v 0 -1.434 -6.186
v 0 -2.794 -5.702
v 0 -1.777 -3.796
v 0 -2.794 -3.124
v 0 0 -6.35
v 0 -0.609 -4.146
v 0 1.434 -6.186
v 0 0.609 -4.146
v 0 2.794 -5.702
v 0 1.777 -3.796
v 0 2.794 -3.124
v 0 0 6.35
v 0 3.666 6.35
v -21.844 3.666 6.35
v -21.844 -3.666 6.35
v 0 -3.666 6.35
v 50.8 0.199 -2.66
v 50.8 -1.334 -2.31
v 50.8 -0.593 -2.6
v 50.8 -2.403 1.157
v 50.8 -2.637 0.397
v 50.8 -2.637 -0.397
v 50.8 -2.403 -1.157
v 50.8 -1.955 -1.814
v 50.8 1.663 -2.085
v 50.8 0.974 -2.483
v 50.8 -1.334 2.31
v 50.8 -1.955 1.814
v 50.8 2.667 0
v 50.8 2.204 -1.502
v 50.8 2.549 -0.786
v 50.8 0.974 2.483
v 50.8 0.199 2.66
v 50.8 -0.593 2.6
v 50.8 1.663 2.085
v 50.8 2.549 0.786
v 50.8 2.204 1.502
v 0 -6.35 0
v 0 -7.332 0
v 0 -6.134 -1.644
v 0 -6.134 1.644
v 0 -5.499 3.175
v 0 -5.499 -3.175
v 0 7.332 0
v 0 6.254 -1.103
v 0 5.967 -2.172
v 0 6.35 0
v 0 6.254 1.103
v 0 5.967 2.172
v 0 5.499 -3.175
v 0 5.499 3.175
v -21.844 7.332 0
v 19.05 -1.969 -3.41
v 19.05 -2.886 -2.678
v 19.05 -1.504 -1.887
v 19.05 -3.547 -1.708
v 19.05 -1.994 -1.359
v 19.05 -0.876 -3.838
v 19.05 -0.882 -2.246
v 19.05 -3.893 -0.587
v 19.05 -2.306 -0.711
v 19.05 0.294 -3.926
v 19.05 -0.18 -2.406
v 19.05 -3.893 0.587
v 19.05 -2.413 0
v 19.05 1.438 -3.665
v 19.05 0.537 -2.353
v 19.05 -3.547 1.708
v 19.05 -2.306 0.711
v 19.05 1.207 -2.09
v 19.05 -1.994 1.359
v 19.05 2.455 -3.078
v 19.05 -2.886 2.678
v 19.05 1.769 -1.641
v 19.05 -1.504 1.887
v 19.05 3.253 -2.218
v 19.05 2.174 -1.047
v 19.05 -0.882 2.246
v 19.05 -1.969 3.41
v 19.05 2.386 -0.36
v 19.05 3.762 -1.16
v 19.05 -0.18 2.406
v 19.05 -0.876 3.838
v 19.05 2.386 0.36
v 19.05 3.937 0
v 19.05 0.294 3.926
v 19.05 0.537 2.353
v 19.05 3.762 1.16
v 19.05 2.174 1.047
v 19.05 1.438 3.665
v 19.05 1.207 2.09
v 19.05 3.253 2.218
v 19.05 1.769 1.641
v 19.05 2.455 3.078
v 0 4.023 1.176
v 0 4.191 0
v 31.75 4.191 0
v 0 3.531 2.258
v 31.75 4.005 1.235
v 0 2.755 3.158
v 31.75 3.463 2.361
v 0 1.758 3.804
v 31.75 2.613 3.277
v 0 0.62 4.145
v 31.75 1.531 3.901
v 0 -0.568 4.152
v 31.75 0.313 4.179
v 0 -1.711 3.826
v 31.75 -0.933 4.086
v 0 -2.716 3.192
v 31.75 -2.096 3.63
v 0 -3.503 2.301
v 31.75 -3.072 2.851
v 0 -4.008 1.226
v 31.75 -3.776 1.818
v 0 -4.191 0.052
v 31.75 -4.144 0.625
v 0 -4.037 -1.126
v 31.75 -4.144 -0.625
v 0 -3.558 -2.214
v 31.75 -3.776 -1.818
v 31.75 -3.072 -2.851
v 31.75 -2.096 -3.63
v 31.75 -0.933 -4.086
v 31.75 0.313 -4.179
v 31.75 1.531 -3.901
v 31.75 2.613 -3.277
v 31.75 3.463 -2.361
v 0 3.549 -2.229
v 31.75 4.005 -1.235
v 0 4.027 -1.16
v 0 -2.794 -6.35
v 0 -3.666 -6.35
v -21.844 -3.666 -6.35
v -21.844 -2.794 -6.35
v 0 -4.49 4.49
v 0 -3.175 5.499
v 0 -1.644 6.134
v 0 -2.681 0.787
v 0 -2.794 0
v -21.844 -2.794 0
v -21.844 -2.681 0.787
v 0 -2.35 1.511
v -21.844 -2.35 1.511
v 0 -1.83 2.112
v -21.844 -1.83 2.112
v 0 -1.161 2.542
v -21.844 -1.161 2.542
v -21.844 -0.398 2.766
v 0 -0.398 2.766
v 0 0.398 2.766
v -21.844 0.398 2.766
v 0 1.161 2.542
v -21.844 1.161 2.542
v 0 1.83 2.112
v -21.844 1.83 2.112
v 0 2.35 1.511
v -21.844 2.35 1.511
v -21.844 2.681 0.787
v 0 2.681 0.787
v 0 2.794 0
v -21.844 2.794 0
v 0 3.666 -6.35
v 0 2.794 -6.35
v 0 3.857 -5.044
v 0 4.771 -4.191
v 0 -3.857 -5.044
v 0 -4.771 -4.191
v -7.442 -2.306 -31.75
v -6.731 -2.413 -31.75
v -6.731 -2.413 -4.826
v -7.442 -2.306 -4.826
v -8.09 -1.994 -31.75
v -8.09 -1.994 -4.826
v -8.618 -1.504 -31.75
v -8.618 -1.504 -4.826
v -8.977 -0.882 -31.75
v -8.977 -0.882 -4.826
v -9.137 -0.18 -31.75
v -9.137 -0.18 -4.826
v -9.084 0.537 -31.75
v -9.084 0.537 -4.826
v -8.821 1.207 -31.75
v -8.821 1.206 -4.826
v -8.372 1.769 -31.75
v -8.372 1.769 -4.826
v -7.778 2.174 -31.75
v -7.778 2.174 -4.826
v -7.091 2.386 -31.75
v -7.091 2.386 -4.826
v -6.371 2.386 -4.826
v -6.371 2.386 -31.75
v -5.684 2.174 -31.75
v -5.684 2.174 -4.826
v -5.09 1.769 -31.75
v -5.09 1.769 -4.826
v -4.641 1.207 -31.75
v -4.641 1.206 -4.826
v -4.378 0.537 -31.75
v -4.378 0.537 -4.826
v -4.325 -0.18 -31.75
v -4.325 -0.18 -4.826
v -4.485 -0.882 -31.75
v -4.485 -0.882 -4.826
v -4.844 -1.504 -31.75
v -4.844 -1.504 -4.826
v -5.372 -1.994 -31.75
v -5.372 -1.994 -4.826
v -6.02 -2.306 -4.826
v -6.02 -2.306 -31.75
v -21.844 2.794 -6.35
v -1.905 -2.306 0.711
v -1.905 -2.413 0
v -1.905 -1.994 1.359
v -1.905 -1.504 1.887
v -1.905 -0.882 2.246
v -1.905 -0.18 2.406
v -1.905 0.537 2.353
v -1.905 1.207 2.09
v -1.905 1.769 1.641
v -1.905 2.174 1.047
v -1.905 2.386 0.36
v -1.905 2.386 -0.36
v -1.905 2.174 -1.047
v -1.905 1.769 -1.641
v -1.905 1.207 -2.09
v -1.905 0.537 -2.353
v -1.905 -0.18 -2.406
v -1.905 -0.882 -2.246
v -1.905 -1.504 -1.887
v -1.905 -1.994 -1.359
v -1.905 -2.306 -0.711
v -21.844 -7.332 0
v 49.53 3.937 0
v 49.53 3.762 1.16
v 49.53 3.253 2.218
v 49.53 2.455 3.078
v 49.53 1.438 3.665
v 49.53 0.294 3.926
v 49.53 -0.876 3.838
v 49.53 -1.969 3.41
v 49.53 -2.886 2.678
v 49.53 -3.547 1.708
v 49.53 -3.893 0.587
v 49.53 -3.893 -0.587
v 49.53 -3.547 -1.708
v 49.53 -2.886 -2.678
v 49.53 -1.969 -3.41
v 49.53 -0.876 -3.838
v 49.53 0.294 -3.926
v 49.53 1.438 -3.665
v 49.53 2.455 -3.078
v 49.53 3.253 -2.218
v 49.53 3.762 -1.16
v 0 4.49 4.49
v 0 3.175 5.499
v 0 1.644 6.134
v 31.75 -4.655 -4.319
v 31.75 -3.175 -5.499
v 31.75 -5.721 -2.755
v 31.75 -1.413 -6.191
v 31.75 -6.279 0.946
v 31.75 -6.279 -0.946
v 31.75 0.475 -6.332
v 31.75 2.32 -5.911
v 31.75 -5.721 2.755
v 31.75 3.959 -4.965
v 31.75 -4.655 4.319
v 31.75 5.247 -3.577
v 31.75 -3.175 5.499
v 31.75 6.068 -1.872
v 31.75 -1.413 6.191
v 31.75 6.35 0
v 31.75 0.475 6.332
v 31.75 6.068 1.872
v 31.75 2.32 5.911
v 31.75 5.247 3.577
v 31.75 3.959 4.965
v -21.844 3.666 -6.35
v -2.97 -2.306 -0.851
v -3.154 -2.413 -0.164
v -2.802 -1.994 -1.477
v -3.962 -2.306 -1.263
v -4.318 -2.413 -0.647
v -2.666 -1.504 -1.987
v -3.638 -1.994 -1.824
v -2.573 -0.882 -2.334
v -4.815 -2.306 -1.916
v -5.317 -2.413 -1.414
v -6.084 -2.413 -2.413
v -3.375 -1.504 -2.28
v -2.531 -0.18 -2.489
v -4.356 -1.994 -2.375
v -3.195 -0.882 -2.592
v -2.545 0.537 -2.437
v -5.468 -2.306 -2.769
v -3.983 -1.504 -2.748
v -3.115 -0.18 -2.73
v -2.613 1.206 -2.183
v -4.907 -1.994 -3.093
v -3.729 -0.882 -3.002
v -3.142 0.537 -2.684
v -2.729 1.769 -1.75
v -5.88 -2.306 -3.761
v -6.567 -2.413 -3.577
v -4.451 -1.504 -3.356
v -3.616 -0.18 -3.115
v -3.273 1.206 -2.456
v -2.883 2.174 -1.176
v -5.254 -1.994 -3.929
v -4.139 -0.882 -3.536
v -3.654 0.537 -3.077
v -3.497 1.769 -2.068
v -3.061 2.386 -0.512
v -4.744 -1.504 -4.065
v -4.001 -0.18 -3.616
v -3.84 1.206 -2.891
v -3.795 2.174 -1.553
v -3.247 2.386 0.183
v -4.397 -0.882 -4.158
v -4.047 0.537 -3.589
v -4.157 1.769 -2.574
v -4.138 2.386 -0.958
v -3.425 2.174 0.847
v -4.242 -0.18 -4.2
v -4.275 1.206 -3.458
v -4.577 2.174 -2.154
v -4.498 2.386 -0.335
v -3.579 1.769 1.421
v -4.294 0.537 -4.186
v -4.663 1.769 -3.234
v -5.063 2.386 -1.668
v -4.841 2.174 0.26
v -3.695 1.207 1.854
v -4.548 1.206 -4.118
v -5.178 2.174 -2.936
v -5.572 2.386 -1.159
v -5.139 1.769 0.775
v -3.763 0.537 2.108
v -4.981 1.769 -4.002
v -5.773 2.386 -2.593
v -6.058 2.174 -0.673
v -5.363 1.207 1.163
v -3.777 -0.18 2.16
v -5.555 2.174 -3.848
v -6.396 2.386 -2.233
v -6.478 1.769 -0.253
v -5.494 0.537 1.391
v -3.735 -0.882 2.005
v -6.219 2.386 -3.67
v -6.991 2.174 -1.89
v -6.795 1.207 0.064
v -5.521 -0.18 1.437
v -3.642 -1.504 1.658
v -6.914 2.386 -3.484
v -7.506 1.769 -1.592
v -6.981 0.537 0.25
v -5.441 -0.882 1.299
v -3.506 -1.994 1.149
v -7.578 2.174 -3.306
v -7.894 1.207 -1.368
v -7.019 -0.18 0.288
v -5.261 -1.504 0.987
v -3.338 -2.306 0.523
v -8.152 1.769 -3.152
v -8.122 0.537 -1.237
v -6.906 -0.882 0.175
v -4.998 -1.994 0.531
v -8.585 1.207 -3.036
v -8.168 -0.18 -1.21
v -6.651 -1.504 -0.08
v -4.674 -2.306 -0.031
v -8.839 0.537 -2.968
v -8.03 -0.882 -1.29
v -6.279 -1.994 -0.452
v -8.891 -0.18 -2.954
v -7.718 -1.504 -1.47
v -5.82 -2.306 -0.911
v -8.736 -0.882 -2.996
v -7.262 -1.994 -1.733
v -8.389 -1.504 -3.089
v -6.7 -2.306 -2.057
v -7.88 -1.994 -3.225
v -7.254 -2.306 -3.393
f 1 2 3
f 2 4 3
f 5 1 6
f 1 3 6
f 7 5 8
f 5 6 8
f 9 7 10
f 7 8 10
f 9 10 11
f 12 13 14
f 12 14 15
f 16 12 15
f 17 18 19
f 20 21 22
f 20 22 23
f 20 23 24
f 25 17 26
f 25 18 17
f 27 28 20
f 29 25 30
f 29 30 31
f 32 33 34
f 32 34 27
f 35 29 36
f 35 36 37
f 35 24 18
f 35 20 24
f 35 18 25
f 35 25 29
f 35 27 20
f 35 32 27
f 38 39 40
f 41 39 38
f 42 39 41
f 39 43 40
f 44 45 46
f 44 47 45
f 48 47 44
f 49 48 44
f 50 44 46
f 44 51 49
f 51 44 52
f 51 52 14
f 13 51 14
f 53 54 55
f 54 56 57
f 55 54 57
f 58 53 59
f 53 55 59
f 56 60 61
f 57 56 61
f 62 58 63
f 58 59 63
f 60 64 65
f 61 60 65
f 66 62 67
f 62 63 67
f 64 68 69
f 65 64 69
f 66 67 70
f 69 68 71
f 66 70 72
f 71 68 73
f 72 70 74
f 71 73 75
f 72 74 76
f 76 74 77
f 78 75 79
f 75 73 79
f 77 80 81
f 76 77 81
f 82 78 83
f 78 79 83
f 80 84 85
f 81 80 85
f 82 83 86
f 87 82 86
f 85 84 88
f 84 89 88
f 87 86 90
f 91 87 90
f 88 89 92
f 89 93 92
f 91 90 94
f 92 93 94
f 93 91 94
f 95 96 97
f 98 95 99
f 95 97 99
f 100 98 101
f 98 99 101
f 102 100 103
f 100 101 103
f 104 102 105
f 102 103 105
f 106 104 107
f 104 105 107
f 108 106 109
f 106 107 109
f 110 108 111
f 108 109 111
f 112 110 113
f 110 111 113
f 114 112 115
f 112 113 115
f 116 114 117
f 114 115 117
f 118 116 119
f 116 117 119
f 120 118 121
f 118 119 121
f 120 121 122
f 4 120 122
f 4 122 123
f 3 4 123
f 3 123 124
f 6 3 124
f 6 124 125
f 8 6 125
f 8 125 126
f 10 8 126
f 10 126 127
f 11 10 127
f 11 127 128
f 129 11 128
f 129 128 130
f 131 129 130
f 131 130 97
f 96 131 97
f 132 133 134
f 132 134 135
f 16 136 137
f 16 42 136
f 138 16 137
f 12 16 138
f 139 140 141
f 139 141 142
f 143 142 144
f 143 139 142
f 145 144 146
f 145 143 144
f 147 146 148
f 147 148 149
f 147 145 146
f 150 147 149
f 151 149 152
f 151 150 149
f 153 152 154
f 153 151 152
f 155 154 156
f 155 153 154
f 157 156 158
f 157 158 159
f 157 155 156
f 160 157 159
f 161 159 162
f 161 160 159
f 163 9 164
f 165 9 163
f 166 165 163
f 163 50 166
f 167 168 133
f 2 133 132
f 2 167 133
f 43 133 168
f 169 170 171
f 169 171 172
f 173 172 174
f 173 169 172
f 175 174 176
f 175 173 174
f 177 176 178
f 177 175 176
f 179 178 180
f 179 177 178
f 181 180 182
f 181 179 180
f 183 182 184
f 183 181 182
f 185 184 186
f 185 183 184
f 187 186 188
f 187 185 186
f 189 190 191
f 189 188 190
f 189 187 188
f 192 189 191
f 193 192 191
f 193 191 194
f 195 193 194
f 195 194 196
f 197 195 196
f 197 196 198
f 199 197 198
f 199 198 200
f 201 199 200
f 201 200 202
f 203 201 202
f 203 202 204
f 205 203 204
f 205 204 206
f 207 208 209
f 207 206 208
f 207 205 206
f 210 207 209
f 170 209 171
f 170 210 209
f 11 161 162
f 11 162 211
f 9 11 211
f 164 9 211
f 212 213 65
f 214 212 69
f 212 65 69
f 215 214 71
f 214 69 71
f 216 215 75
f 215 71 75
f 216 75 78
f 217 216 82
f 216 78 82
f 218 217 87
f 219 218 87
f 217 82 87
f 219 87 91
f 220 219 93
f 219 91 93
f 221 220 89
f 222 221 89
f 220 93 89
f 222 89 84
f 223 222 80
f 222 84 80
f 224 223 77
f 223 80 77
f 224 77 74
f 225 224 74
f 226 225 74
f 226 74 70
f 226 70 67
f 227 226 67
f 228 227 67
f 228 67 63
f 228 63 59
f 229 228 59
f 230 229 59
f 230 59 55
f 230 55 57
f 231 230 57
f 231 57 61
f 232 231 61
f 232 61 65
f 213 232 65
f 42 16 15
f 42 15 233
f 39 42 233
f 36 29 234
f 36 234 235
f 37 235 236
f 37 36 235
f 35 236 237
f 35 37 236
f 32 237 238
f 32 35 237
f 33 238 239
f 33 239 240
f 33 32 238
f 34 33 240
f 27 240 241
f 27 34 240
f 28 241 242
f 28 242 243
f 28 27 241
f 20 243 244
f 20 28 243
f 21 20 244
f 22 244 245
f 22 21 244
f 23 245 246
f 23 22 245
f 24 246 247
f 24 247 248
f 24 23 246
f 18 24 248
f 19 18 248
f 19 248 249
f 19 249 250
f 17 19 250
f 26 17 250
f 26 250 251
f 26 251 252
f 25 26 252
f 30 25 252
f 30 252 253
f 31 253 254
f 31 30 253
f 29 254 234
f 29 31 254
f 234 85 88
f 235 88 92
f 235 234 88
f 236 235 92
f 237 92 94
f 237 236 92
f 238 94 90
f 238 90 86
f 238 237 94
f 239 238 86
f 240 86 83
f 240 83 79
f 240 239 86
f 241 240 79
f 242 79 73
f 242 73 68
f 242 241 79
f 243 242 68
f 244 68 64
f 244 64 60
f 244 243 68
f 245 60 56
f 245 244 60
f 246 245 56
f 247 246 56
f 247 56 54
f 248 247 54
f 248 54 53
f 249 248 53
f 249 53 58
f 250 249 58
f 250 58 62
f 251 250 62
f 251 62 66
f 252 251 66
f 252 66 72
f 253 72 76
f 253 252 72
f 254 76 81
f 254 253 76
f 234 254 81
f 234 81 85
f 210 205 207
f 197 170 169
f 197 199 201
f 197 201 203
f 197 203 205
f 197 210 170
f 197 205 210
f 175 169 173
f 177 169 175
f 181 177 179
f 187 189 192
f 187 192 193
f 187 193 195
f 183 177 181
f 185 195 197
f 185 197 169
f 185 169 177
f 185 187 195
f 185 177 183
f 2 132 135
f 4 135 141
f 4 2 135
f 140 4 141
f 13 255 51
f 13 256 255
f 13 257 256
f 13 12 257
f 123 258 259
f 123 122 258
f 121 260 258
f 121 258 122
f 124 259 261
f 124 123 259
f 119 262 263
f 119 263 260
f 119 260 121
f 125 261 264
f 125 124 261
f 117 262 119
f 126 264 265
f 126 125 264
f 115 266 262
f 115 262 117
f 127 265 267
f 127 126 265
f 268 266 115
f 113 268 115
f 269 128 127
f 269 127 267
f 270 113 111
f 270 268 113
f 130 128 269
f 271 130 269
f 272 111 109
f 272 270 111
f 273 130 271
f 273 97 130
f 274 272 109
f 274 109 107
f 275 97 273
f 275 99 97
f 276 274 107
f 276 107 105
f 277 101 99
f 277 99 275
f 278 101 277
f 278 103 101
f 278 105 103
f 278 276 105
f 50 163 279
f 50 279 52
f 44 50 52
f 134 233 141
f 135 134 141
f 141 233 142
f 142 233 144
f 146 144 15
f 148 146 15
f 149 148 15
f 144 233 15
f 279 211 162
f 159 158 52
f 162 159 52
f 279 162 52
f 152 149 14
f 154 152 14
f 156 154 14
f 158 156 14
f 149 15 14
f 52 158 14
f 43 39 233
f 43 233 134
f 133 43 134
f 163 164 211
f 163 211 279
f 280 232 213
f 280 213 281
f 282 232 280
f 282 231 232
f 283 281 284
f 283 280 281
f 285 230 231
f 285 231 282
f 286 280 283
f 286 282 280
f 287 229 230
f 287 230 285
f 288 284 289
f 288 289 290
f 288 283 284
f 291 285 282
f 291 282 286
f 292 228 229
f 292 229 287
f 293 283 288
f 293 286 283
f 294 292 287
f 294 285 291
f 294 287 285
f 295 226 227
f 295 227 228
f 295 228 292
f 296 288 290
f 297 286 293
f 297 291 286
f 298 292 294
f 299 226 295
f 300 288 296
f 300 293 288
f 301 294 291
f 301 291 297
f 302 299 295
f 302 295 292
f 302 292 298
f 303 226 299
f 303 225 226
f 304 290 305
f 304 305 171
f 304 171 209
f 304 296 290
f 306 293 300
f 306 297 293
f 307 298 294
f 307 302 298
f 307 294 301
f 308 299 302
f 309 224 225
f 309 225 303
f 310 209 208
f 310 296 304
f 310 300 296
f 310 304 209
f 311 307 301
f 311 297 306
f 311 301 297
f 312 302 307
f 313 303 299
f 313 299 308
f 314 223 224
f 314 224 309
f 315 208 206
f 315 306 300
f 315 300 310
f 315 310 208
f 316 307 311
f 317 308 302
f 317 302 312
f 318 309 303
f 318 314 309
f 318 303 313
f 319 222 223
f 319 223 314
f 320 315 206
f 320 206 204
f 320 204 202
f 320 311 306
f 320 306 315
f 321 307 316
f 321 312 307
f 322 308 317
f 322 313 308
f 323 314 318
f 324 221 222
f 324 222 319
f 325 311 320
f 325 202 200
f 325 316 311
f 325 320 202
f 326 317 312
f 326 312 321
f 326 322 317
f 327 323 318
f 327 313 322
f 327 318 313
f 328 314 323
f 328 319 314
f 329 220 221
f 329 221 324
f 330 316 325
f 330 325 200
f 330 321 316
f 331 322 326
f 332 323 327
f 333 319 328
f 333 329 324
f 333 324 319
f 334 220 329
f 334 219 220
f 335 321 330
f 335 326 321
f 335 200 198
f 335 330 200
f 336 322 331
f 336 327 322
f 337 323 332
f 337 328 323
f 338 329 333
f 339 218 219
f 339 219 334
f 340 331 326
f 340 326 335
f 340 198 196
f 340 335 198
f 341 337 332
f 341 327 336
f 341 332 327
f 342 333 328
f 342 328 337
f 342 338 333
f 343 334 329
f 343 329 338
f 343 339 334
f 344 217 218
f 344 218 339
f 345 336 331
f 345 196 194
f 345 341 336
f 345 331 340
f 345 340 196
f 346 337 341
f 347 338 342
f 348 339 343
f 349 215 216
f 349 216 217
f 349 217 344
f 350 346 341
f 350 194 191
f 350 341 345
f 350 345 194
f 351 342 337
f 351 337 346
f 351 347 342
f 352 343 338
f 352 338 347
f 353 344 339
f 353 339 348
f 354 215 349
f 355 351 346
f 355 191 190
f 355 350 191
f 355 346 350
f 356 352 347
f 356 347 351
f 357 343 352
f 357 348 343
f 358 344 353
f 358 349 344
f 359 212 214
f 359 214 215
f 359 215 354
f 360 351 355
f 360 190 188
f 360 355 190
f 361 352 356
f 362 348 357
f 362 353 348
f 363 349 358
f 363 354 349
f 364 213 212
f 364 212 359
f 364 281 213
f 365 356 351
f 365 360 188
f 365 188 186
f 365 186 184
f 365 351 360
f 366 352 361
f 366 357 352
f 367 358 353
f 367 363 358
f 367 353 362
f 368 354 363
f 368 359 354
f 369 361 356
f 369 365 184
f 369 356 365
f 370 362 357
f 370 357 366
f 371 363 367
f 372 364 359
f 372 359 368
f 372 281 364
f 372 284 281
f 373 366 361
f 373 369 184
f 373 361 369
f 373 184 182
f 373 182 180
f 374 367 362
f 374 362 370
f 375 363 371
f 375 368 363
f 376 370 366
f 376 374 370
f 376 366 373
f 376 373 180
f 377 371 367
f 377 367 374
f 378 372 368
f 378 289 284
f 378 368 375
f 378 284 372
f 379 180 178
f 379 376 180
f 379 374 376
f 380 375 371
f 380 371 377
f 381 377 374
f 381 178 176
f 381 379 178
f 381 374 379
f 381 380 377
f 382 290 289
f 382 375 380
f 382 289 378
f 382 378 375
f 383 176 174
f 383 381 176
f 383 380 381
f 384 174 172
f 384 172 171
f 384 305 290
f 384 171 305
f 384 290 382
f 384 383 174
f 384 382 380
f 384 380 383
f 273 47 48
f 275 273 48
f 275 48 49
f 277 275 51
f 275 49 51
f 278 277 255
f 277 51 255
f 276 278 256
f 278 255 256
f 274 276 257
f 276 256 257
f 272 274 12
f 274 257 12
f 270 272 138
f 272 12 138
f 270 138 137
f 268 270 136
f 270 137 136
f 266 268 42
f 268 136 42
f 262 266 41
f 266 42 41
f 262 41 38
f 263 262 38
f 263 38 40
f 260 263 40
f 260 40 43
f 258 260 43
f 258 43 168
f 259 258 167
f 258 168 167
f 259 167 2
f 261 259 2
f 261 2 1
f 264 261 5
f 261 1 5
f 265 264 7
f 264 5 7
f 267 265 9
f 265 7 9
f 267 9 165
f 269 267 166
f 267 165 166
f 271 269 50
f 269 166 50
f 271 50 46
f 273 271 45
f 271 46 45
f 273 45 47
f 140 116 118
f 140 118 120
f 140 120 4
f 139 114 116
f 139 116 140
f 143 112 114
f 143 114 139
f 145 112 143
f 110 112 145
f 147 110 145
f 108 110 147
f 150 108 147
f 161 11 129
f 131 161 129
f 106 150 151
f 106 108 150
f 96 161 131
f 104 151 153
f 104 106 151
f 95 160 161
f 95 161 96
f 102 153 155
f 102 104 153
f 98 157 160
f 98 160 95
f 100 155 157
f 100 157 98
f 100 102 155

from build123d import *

# Parameters (mm, degrees)
F0_R       = 6.35
F1_DEPTH   = 31.75
F2_R       = 4.191
F3_DEPTH   = 31.751
F5_R       = 3.937
F6_DEPTH   = 31.75
F8_DEPTH   = 21.844
F9_R       = 2.413
F10_DEPTH  = 20.955
F10_FACE_R = 2.413
F13_SIZE   = 1.27


with BuildPart() as f1:
    # F0 (on Right) → F1 (new body)
    with BuildSketch(Plane.YZ):
        Circle(F0_R)
    extrude(amount=F1_DEPTH)

    # F2 (on face) → F3 (cut, through all)
    with BuildSketch(Plane.YZ.offset(31.75)):
        Circle(F2_R)
    extrude(amount=-F3_DEPTH, mode=Mode.SUBTRACT)

    # F7 (on Right) → F8 (join)
    with BuildSketch(Plane.YZ):
        with BuildLine():
            Line((3.666174, 6.35), (-3.666174, 6.35))
            Line((-3.666174, 6.35), (-7.332348, 0))
            Line((-7.332348, 0), (-3.666174, -6.35))
            Line((-3.666174, -6.35), (-2.794, -6.35))
            Line((-2.794, -6.35), (-2.794, 0))
            ThreePointArc((-2.794, 0), (0, 2.794), (2.794, 0))
            Line((2.794, 0), (2.794, -6.35))
            Line((2.794, -6.35), (3.666174, -6.35))
            Line((3.666174, -6.35), (7.332348, 0))
            Line((7.332348, 0), (3.666174, 6.35))
        make_face()
    extrude(amount=-F8_DEPTH)


with BuildPart() as f6:
    # F5 (on offset) → F6 (new body)
    with BuildSketch(Plane.YZ.offset(50.8)):
        Circle(F5_R)
    extrude(amount=-F6_DEPTH)

    # F9 (on face) → F10 (join)
    with BuildSketch(Plane(origin=(19.05, 0, 0), x_dir=(0, -1, 0), z_dir=(-1, 0, 0))):
        Circle(F9_R)
    extrude(amount=F10_DEPTH)

    # F12: sweep along a path in F11
    with BuildLine(Plane.XZ) as f12_path:
        ThreePointArc((-1.905, 0), (-5.317497, -1.413503), (-6.731, -4.826))
        Line((-6.731, -4.826), (-6.731, -31.75))
    # F10_face (on face) → F12 (sweep)
    with BuildSketch(Plane(origin=(-1.905, 0, 0), x_dir=(0, -1, 0), z_dir=(-1, 0, 0))):
        Circle(F10_FACE_R)
    sweep(path=f12_path.line)

    # F13
    f13_edges = [f6.edges().sort_by_distance(p)[0] for p in [
        (50.8, -3.937, 0),
    ]]
    chamfer(f13_edges, length=F13_SIZE)


solid = Compound([f1.part, f6.part])
